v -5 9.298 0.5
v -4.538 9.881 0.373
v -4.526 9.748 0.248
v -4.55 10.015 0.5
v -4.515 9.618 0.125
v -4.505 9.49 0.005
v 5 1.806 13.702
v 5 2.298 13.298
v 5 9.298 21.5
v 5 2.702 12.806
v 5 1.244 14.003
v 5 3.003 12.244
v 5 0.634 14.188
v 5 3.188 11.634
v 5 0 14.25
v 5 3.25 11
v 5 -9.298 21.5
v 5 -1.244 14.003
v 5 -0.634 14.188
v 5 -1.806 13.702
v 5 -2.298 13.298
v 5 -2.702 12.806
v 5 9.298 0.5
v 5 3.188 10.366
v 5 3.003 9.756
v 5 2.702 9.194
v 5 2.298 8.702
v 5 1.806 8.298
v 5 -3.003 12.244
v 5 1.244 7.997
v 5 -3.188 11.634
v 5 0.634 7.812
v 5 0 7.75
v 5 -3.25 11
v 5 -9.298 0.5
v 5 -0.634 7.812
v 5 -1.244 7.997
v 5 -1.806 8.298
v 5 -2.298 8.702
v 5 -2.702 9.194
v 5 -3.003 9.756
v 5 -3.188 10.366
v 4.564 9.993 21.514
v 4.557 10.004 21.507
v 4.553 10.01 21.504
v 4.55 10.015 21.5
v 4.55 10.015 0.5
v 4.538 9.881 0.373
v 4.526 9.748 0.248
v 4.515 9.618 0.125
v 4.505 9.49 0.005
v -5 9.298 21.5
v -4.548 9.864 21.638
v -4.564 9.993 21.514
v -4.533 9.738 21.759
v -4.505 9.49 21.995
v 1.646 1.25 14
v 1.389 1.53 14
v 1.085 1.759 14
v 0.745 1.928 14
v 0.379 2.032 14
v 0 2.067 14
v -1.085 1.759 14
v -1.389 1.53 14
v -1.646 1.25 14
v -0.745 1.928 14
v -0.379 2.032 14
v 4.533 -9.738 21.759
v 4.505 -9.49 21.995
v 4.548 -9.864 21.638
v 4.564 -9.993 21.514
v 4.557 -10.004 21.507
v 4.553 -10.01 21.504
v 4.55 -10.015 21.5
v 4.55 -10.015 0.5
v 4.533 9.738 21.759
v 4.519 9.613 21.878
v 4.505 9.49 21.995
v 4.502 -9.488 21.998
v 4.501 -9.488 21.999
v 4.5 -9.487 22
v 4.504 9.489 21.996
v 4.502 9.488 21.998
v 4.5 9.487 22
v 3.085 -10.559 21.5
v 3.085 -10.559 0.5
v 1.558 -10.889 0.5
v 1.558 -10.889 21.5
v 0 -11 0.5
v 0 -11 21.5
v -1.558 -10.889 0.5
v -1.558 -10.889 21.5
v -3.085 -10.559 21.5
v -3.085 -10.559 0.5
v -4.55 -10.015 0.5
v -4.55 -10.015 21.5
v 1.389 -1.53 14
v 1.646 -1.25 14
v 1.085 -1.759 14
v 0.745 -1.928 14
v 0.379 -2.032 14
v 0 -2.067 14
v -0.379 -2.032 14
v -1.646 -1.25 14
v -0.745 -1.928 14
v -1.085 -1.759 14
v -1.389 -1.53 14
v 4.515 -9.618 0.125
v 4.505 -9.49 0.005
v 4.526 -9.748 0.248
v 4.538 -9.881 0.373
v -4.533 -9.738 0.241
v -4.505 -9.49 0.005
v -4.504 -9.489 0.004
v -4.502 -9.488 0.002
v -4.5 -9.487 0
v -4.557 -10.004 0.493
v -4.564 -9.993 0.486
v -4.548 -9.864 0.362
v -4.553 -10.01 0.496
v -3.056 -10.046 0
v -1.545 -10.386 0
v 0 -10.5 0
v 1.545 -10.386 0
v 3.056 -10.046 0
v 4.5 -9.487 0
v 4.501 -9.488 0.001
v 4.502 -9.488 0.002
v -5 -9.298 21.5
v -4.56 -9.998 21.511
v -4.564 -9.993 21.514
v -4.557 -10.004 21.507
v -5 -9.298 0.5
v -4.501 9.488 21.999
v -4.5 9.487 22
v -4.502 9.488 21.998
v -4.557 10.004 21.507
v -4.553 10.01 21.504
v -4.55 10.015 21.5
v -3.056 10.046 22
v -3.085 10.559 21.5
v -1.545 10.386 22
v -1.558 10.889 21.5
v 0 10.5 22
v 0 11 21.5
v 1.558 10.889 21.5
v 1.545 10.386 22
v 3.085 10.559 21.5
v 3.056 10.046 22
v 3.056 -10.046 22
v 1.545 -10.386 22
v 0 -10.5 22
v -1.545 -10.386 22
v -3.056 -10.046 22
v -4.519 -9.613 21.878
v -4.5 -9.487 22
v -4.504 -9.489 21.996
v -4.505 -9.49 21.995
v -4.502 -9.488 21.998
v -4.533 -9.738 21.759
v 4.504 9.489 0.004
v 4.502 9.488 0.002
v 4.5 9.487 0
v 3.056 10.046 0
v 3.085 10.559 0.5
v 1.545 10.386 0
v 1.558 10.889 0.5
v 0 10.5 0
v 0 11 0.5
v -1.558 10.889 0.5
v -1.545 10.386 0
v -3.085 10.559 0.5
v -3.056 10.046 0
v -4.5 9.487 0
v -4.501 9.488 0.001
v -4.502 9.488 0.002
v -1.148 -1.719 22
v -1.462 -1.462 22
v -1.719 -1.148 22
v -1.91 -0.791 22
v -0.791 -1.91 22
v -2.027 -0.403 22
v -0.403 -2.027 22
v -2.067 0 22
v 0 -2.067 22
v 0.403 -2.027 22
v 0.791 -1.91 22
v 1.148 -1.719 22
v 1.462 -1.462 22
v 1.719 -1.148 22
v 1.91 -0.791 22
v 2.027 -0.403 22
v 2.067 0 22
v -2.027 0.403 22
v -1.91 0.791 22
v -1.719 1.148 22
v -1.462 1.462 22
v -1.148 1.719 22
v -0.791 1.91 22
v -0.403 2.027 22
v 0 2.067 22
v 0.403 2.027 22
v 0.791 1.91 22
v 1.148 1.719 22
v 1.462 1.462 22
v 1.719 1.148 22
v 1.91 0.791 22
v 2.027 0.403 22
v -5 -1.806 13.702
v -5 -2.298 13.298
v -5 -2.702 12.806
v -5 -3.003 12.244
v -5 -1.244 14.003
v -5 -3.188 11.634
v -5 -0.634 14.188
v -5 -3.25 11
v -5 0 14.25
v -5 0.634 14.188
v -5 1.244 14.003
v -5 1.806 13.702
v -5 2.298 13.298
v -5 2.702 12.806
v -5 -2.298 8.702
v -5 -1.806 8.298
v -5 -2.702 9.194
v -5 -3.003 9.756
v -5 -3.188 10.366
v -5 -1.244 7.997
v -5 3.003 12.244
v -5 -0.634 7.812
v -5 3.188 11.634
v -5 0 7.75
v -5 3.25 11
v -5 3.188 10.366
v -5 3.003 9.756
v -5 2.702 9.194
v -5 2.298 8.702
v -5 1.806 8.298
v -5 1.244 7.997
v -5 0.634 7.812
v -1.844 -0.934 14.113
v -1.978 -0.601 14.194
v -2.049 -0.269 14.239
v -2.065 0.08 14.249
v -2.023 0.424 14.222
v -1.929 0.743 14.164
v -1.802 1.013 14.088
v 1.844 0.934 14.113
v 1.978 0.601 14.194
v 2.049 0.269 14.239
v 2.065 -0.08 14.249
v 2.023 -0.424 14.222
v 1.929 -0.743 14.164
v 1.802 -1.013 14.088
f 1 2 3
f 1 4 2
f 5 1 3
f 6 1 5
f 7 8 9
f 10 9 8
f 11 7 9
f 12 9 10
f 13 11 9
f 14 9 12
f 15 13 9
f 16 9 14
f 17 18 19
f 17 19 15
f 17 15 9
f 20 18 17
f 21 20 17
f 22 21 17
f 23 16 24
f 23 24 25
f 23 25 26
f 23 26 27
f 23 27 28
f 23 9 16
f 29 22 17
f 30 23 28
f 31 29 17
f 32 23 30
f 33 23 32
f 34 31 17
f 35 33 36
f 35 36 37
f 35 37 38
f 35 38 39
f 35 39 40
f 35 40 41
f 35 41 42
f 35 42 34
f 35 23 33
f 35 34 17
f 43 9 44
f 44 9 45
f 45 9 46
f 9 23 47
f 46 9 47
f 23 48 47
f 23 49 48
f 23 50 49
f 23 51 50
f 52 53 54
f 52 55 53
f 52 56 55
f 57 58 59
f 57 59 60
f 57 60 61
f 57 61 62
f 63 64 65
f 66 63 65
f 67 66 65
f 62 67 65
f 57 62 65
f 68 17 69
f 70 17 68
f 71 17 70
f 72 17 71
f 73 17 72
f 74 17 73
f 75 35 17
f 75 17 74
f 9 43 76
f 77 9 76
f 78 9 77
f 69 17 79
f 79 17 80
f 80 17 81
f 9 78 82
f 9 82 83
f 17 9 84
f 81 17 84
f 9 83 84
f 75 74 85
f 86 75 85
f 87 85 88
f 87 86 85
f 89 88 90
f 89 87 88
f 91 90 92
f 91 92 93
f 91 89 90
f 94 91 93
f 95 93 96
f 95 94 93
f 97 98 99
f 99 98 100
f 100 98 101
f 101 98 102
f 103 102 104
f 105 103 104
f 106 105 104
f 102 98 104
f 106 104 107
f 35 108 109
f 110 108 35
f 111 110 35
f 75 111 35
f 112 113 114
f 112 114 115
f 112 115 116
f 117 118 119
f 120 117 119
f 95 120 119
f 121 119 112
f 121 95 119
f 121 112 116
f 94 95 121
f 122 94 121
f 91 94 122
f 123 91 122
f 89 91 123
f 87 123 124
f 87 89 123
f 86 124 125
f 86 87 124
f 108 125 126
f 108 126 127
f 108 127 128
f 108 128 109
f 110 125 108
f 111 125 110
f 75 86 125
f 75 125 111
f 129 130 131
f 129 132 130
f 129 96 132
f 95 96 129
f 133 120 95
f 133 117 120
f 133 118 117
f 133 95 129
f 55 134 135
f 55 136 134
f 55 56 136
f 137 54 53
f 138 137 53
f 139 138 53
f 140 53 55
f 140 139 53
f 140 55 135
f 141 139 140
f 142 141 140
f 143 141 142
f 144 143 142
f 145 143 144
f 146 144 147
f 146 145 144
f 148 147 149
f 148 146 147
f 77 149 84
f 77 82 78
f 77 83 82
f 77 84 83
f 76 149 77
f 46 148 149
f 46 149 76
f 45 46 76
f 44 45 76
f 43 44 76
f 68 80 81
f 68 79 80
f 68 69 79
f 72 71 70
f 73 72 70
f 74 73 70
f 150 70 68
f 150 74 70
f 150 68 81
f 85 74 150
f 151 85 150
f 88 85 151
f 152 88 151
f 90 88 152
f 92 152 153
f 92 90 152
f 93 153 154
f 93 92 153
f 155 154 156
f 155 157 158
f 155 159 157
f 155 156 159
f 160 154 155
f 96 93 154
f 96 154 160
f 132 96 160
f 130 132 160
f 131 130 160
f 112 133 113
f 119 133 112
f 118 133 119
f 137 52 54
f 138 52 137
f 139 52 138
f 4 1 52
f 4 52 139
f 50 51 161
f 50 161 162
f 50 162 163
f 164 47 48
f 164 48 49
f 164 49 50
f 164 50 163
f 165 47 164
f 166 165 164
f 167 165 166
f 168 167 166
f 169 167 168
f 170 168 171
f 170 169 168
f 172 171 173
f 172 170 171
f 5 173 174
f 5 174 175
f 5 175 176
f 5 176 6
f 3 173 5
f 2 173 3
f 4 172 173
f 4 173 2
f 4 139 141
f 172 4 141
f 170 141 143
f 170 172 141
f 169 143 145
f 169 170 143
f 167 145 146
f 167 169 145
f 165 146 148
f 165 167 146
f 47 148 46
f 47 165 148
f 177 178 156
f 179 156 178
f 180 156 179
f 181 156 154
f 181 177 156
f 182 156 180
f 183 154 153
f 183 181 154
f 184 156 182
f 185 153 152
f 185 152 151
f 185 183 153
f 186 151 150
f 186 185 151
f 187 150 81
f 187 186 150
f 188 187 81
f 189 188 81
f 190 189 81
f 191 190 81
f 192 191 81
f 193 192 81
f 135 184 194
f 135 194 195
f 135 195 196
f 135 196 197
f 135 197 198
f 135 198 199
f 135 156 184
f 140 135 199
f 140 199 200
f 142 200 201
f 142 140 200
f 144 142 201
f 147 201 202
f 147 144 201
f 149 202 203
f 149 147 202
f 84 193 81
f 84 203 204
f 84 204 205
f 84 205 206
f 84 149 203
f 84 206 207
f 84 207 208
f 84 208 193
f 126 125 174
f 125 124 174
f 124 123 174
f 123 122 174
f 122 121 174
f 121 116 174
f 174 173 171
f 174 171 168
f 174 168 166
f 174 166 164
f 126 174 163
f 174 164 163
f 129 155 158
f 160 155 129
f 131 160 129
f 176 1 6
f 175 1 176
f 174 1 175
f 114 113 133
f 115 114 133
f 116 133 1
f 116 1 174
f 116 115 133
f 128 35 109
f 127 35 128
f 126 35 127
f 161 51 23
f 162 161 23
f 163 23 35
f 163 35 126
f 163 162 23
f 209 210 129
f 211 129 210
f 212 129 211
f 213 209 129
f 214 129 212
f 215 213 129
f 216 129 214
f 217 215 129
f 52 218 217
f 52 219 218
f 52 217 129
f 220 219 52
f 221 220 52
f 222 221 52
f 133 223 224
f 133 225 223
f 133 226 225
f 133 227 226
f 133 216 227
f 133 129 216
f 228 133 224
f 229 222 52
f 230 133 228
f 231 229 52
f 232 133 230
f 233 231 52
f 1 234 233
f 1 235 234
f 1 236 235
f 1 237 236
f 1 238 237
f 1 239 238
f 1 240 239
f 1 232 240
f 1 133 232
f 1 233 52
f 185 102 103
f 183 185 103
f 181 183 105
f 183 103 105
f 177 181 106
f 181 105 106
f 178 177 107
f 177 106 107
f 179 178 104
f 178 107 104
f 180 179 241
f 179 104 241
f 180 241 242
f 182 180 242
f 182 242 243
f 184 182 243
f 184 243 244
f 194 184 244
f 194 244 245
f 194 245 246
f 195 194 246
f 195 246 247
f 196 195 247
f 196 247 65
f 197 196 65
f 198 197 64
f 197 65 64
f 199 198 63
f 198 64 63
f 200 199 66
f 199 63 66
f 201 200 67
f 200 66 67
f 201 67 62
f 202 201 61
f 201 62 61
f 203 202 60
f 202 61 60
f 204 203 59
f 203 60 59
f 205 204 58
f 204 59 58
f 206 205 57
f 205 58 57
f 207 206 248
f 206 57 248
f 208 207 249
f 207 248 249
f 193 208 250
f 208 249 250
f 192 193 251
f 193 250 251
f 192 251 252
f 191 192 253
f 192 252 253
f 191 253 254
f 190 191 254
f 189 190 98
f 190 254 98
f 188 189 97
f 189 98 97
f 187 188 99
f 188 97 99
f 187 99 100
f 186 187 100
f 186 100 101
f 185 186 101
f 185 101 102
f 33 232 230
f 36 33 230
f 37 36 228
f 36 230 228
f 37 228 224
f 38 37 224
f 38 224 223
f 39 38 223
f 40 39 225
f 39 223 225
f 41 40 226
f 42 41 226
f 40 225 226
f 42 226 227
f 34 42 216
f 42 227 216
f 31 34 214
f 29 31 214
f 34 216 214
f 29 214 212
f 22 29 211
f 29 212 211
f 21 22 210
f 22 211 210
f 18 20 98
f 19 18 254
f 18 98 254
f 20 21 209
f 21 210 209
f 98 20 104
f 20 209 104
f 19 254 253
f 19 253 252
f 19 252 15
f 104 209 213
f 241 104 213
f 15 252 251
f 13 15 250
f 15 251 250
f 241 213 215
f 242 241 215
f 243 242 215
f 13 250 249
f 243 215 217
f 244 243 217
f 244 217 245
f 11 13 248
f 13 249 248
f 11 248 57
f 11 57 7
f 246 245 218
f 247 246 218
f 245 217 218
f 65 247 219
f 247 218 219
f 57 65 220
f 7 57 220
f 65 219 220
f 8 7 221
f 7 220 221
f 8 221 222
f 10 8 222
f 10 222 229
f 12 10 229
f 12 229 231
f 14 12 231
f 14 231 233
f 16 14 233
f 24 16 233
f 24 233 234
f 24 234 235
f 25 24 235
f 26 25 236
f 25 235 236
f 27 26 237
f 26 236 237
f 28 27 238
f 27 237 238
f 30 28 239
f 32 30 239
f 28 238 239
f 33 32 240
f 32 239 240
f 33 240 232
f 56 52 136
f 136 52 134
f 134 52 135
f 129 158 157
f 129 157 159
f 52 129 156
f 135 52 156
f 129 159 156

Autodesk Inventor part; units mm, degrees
ref_plane "YZ Plane" through (0, 0, 0) normal (1, 0, 0) x (0, 1, 0)
ref_plane "XZ Plane" through (0, 0, 0) normal (0, 1, 0) x (-1, 0, 0)
ref_plane "XY Plane" through (0, 0, 0) normal (0, 0, 1) x (1, 0, 0)
sketch "Sketch1" plane through (0, 0, 0) normal (0, 0, 1) x (1, 0, 0)
  line L0 (5, 9.798) -> (5, -9.798)
  line L1 (-5, -9.798) -> (-5, 9.798)
  arc A0 (-5, -9.798) -> (5, -9.798) centre (0, 0) ccw
  arc A1 (5, 9.798) -> (-5, 9.798) centre (0, 0) ccw
  point P0 (0, 12.4867)
  point P1 (5, 0)
  dimension "d1" = 10
  dimension "d2" = 11
  dimension "d3" = 11
  dimension "d4" = 5
  dimension "d5" = 12.4867
extrude "Extrusion1" add sketch "Sketch1" along normal blind 22
chamfer "Chamfer1" distance 0.5 angle 45 12 edges at (0, 11, 22) (5, 0, 22) (0, -11, 22) (-5, 0, 22) (5, 9.798, 11) (-5, 9.798, 11) (0, 11, 0) (5, 0, 0) (5, -9.798, 11) (0, -11, 0) (-5, 0, 0) (-5, -9.798, 11)
sketch "Sketch2" plane through (0, 0, 22) normal (0, 0, 1) x (1, 0, 0)
  arc A0 (4.5, 9.4868) -> (-4.5, 9.4868) centre (0, 0) ccw projected
hole "Hole1" at (0, 0, 22) direction (0, 0, -1) diameter 4.134 depth 8 thread size "M5x0.8" class "6H" standard "ANSI Metric M Profile"
sketch "Sketch3" plane through (5, -9.298, 0.5) normal (1, 0, 0) x (0, 0, -1)
  line L0 (-21, 18.5959) -> (0, 18.5959) projected
  line L1 (-21, 0) -> (-21, 18.5959) projected
  point P0 (0.5, 9.298)
  point P1 (-10.5, 9.298)
  point P2 (-21, 9.298)
  point P3 (-10.5, 18.5959)
hole "Hole2" at (5, 0, 11) direction (-1, 0, 0) diameter 6.5 end through all
properties part number "19 - Crosshead" material "Bronze, Soft Tin"
